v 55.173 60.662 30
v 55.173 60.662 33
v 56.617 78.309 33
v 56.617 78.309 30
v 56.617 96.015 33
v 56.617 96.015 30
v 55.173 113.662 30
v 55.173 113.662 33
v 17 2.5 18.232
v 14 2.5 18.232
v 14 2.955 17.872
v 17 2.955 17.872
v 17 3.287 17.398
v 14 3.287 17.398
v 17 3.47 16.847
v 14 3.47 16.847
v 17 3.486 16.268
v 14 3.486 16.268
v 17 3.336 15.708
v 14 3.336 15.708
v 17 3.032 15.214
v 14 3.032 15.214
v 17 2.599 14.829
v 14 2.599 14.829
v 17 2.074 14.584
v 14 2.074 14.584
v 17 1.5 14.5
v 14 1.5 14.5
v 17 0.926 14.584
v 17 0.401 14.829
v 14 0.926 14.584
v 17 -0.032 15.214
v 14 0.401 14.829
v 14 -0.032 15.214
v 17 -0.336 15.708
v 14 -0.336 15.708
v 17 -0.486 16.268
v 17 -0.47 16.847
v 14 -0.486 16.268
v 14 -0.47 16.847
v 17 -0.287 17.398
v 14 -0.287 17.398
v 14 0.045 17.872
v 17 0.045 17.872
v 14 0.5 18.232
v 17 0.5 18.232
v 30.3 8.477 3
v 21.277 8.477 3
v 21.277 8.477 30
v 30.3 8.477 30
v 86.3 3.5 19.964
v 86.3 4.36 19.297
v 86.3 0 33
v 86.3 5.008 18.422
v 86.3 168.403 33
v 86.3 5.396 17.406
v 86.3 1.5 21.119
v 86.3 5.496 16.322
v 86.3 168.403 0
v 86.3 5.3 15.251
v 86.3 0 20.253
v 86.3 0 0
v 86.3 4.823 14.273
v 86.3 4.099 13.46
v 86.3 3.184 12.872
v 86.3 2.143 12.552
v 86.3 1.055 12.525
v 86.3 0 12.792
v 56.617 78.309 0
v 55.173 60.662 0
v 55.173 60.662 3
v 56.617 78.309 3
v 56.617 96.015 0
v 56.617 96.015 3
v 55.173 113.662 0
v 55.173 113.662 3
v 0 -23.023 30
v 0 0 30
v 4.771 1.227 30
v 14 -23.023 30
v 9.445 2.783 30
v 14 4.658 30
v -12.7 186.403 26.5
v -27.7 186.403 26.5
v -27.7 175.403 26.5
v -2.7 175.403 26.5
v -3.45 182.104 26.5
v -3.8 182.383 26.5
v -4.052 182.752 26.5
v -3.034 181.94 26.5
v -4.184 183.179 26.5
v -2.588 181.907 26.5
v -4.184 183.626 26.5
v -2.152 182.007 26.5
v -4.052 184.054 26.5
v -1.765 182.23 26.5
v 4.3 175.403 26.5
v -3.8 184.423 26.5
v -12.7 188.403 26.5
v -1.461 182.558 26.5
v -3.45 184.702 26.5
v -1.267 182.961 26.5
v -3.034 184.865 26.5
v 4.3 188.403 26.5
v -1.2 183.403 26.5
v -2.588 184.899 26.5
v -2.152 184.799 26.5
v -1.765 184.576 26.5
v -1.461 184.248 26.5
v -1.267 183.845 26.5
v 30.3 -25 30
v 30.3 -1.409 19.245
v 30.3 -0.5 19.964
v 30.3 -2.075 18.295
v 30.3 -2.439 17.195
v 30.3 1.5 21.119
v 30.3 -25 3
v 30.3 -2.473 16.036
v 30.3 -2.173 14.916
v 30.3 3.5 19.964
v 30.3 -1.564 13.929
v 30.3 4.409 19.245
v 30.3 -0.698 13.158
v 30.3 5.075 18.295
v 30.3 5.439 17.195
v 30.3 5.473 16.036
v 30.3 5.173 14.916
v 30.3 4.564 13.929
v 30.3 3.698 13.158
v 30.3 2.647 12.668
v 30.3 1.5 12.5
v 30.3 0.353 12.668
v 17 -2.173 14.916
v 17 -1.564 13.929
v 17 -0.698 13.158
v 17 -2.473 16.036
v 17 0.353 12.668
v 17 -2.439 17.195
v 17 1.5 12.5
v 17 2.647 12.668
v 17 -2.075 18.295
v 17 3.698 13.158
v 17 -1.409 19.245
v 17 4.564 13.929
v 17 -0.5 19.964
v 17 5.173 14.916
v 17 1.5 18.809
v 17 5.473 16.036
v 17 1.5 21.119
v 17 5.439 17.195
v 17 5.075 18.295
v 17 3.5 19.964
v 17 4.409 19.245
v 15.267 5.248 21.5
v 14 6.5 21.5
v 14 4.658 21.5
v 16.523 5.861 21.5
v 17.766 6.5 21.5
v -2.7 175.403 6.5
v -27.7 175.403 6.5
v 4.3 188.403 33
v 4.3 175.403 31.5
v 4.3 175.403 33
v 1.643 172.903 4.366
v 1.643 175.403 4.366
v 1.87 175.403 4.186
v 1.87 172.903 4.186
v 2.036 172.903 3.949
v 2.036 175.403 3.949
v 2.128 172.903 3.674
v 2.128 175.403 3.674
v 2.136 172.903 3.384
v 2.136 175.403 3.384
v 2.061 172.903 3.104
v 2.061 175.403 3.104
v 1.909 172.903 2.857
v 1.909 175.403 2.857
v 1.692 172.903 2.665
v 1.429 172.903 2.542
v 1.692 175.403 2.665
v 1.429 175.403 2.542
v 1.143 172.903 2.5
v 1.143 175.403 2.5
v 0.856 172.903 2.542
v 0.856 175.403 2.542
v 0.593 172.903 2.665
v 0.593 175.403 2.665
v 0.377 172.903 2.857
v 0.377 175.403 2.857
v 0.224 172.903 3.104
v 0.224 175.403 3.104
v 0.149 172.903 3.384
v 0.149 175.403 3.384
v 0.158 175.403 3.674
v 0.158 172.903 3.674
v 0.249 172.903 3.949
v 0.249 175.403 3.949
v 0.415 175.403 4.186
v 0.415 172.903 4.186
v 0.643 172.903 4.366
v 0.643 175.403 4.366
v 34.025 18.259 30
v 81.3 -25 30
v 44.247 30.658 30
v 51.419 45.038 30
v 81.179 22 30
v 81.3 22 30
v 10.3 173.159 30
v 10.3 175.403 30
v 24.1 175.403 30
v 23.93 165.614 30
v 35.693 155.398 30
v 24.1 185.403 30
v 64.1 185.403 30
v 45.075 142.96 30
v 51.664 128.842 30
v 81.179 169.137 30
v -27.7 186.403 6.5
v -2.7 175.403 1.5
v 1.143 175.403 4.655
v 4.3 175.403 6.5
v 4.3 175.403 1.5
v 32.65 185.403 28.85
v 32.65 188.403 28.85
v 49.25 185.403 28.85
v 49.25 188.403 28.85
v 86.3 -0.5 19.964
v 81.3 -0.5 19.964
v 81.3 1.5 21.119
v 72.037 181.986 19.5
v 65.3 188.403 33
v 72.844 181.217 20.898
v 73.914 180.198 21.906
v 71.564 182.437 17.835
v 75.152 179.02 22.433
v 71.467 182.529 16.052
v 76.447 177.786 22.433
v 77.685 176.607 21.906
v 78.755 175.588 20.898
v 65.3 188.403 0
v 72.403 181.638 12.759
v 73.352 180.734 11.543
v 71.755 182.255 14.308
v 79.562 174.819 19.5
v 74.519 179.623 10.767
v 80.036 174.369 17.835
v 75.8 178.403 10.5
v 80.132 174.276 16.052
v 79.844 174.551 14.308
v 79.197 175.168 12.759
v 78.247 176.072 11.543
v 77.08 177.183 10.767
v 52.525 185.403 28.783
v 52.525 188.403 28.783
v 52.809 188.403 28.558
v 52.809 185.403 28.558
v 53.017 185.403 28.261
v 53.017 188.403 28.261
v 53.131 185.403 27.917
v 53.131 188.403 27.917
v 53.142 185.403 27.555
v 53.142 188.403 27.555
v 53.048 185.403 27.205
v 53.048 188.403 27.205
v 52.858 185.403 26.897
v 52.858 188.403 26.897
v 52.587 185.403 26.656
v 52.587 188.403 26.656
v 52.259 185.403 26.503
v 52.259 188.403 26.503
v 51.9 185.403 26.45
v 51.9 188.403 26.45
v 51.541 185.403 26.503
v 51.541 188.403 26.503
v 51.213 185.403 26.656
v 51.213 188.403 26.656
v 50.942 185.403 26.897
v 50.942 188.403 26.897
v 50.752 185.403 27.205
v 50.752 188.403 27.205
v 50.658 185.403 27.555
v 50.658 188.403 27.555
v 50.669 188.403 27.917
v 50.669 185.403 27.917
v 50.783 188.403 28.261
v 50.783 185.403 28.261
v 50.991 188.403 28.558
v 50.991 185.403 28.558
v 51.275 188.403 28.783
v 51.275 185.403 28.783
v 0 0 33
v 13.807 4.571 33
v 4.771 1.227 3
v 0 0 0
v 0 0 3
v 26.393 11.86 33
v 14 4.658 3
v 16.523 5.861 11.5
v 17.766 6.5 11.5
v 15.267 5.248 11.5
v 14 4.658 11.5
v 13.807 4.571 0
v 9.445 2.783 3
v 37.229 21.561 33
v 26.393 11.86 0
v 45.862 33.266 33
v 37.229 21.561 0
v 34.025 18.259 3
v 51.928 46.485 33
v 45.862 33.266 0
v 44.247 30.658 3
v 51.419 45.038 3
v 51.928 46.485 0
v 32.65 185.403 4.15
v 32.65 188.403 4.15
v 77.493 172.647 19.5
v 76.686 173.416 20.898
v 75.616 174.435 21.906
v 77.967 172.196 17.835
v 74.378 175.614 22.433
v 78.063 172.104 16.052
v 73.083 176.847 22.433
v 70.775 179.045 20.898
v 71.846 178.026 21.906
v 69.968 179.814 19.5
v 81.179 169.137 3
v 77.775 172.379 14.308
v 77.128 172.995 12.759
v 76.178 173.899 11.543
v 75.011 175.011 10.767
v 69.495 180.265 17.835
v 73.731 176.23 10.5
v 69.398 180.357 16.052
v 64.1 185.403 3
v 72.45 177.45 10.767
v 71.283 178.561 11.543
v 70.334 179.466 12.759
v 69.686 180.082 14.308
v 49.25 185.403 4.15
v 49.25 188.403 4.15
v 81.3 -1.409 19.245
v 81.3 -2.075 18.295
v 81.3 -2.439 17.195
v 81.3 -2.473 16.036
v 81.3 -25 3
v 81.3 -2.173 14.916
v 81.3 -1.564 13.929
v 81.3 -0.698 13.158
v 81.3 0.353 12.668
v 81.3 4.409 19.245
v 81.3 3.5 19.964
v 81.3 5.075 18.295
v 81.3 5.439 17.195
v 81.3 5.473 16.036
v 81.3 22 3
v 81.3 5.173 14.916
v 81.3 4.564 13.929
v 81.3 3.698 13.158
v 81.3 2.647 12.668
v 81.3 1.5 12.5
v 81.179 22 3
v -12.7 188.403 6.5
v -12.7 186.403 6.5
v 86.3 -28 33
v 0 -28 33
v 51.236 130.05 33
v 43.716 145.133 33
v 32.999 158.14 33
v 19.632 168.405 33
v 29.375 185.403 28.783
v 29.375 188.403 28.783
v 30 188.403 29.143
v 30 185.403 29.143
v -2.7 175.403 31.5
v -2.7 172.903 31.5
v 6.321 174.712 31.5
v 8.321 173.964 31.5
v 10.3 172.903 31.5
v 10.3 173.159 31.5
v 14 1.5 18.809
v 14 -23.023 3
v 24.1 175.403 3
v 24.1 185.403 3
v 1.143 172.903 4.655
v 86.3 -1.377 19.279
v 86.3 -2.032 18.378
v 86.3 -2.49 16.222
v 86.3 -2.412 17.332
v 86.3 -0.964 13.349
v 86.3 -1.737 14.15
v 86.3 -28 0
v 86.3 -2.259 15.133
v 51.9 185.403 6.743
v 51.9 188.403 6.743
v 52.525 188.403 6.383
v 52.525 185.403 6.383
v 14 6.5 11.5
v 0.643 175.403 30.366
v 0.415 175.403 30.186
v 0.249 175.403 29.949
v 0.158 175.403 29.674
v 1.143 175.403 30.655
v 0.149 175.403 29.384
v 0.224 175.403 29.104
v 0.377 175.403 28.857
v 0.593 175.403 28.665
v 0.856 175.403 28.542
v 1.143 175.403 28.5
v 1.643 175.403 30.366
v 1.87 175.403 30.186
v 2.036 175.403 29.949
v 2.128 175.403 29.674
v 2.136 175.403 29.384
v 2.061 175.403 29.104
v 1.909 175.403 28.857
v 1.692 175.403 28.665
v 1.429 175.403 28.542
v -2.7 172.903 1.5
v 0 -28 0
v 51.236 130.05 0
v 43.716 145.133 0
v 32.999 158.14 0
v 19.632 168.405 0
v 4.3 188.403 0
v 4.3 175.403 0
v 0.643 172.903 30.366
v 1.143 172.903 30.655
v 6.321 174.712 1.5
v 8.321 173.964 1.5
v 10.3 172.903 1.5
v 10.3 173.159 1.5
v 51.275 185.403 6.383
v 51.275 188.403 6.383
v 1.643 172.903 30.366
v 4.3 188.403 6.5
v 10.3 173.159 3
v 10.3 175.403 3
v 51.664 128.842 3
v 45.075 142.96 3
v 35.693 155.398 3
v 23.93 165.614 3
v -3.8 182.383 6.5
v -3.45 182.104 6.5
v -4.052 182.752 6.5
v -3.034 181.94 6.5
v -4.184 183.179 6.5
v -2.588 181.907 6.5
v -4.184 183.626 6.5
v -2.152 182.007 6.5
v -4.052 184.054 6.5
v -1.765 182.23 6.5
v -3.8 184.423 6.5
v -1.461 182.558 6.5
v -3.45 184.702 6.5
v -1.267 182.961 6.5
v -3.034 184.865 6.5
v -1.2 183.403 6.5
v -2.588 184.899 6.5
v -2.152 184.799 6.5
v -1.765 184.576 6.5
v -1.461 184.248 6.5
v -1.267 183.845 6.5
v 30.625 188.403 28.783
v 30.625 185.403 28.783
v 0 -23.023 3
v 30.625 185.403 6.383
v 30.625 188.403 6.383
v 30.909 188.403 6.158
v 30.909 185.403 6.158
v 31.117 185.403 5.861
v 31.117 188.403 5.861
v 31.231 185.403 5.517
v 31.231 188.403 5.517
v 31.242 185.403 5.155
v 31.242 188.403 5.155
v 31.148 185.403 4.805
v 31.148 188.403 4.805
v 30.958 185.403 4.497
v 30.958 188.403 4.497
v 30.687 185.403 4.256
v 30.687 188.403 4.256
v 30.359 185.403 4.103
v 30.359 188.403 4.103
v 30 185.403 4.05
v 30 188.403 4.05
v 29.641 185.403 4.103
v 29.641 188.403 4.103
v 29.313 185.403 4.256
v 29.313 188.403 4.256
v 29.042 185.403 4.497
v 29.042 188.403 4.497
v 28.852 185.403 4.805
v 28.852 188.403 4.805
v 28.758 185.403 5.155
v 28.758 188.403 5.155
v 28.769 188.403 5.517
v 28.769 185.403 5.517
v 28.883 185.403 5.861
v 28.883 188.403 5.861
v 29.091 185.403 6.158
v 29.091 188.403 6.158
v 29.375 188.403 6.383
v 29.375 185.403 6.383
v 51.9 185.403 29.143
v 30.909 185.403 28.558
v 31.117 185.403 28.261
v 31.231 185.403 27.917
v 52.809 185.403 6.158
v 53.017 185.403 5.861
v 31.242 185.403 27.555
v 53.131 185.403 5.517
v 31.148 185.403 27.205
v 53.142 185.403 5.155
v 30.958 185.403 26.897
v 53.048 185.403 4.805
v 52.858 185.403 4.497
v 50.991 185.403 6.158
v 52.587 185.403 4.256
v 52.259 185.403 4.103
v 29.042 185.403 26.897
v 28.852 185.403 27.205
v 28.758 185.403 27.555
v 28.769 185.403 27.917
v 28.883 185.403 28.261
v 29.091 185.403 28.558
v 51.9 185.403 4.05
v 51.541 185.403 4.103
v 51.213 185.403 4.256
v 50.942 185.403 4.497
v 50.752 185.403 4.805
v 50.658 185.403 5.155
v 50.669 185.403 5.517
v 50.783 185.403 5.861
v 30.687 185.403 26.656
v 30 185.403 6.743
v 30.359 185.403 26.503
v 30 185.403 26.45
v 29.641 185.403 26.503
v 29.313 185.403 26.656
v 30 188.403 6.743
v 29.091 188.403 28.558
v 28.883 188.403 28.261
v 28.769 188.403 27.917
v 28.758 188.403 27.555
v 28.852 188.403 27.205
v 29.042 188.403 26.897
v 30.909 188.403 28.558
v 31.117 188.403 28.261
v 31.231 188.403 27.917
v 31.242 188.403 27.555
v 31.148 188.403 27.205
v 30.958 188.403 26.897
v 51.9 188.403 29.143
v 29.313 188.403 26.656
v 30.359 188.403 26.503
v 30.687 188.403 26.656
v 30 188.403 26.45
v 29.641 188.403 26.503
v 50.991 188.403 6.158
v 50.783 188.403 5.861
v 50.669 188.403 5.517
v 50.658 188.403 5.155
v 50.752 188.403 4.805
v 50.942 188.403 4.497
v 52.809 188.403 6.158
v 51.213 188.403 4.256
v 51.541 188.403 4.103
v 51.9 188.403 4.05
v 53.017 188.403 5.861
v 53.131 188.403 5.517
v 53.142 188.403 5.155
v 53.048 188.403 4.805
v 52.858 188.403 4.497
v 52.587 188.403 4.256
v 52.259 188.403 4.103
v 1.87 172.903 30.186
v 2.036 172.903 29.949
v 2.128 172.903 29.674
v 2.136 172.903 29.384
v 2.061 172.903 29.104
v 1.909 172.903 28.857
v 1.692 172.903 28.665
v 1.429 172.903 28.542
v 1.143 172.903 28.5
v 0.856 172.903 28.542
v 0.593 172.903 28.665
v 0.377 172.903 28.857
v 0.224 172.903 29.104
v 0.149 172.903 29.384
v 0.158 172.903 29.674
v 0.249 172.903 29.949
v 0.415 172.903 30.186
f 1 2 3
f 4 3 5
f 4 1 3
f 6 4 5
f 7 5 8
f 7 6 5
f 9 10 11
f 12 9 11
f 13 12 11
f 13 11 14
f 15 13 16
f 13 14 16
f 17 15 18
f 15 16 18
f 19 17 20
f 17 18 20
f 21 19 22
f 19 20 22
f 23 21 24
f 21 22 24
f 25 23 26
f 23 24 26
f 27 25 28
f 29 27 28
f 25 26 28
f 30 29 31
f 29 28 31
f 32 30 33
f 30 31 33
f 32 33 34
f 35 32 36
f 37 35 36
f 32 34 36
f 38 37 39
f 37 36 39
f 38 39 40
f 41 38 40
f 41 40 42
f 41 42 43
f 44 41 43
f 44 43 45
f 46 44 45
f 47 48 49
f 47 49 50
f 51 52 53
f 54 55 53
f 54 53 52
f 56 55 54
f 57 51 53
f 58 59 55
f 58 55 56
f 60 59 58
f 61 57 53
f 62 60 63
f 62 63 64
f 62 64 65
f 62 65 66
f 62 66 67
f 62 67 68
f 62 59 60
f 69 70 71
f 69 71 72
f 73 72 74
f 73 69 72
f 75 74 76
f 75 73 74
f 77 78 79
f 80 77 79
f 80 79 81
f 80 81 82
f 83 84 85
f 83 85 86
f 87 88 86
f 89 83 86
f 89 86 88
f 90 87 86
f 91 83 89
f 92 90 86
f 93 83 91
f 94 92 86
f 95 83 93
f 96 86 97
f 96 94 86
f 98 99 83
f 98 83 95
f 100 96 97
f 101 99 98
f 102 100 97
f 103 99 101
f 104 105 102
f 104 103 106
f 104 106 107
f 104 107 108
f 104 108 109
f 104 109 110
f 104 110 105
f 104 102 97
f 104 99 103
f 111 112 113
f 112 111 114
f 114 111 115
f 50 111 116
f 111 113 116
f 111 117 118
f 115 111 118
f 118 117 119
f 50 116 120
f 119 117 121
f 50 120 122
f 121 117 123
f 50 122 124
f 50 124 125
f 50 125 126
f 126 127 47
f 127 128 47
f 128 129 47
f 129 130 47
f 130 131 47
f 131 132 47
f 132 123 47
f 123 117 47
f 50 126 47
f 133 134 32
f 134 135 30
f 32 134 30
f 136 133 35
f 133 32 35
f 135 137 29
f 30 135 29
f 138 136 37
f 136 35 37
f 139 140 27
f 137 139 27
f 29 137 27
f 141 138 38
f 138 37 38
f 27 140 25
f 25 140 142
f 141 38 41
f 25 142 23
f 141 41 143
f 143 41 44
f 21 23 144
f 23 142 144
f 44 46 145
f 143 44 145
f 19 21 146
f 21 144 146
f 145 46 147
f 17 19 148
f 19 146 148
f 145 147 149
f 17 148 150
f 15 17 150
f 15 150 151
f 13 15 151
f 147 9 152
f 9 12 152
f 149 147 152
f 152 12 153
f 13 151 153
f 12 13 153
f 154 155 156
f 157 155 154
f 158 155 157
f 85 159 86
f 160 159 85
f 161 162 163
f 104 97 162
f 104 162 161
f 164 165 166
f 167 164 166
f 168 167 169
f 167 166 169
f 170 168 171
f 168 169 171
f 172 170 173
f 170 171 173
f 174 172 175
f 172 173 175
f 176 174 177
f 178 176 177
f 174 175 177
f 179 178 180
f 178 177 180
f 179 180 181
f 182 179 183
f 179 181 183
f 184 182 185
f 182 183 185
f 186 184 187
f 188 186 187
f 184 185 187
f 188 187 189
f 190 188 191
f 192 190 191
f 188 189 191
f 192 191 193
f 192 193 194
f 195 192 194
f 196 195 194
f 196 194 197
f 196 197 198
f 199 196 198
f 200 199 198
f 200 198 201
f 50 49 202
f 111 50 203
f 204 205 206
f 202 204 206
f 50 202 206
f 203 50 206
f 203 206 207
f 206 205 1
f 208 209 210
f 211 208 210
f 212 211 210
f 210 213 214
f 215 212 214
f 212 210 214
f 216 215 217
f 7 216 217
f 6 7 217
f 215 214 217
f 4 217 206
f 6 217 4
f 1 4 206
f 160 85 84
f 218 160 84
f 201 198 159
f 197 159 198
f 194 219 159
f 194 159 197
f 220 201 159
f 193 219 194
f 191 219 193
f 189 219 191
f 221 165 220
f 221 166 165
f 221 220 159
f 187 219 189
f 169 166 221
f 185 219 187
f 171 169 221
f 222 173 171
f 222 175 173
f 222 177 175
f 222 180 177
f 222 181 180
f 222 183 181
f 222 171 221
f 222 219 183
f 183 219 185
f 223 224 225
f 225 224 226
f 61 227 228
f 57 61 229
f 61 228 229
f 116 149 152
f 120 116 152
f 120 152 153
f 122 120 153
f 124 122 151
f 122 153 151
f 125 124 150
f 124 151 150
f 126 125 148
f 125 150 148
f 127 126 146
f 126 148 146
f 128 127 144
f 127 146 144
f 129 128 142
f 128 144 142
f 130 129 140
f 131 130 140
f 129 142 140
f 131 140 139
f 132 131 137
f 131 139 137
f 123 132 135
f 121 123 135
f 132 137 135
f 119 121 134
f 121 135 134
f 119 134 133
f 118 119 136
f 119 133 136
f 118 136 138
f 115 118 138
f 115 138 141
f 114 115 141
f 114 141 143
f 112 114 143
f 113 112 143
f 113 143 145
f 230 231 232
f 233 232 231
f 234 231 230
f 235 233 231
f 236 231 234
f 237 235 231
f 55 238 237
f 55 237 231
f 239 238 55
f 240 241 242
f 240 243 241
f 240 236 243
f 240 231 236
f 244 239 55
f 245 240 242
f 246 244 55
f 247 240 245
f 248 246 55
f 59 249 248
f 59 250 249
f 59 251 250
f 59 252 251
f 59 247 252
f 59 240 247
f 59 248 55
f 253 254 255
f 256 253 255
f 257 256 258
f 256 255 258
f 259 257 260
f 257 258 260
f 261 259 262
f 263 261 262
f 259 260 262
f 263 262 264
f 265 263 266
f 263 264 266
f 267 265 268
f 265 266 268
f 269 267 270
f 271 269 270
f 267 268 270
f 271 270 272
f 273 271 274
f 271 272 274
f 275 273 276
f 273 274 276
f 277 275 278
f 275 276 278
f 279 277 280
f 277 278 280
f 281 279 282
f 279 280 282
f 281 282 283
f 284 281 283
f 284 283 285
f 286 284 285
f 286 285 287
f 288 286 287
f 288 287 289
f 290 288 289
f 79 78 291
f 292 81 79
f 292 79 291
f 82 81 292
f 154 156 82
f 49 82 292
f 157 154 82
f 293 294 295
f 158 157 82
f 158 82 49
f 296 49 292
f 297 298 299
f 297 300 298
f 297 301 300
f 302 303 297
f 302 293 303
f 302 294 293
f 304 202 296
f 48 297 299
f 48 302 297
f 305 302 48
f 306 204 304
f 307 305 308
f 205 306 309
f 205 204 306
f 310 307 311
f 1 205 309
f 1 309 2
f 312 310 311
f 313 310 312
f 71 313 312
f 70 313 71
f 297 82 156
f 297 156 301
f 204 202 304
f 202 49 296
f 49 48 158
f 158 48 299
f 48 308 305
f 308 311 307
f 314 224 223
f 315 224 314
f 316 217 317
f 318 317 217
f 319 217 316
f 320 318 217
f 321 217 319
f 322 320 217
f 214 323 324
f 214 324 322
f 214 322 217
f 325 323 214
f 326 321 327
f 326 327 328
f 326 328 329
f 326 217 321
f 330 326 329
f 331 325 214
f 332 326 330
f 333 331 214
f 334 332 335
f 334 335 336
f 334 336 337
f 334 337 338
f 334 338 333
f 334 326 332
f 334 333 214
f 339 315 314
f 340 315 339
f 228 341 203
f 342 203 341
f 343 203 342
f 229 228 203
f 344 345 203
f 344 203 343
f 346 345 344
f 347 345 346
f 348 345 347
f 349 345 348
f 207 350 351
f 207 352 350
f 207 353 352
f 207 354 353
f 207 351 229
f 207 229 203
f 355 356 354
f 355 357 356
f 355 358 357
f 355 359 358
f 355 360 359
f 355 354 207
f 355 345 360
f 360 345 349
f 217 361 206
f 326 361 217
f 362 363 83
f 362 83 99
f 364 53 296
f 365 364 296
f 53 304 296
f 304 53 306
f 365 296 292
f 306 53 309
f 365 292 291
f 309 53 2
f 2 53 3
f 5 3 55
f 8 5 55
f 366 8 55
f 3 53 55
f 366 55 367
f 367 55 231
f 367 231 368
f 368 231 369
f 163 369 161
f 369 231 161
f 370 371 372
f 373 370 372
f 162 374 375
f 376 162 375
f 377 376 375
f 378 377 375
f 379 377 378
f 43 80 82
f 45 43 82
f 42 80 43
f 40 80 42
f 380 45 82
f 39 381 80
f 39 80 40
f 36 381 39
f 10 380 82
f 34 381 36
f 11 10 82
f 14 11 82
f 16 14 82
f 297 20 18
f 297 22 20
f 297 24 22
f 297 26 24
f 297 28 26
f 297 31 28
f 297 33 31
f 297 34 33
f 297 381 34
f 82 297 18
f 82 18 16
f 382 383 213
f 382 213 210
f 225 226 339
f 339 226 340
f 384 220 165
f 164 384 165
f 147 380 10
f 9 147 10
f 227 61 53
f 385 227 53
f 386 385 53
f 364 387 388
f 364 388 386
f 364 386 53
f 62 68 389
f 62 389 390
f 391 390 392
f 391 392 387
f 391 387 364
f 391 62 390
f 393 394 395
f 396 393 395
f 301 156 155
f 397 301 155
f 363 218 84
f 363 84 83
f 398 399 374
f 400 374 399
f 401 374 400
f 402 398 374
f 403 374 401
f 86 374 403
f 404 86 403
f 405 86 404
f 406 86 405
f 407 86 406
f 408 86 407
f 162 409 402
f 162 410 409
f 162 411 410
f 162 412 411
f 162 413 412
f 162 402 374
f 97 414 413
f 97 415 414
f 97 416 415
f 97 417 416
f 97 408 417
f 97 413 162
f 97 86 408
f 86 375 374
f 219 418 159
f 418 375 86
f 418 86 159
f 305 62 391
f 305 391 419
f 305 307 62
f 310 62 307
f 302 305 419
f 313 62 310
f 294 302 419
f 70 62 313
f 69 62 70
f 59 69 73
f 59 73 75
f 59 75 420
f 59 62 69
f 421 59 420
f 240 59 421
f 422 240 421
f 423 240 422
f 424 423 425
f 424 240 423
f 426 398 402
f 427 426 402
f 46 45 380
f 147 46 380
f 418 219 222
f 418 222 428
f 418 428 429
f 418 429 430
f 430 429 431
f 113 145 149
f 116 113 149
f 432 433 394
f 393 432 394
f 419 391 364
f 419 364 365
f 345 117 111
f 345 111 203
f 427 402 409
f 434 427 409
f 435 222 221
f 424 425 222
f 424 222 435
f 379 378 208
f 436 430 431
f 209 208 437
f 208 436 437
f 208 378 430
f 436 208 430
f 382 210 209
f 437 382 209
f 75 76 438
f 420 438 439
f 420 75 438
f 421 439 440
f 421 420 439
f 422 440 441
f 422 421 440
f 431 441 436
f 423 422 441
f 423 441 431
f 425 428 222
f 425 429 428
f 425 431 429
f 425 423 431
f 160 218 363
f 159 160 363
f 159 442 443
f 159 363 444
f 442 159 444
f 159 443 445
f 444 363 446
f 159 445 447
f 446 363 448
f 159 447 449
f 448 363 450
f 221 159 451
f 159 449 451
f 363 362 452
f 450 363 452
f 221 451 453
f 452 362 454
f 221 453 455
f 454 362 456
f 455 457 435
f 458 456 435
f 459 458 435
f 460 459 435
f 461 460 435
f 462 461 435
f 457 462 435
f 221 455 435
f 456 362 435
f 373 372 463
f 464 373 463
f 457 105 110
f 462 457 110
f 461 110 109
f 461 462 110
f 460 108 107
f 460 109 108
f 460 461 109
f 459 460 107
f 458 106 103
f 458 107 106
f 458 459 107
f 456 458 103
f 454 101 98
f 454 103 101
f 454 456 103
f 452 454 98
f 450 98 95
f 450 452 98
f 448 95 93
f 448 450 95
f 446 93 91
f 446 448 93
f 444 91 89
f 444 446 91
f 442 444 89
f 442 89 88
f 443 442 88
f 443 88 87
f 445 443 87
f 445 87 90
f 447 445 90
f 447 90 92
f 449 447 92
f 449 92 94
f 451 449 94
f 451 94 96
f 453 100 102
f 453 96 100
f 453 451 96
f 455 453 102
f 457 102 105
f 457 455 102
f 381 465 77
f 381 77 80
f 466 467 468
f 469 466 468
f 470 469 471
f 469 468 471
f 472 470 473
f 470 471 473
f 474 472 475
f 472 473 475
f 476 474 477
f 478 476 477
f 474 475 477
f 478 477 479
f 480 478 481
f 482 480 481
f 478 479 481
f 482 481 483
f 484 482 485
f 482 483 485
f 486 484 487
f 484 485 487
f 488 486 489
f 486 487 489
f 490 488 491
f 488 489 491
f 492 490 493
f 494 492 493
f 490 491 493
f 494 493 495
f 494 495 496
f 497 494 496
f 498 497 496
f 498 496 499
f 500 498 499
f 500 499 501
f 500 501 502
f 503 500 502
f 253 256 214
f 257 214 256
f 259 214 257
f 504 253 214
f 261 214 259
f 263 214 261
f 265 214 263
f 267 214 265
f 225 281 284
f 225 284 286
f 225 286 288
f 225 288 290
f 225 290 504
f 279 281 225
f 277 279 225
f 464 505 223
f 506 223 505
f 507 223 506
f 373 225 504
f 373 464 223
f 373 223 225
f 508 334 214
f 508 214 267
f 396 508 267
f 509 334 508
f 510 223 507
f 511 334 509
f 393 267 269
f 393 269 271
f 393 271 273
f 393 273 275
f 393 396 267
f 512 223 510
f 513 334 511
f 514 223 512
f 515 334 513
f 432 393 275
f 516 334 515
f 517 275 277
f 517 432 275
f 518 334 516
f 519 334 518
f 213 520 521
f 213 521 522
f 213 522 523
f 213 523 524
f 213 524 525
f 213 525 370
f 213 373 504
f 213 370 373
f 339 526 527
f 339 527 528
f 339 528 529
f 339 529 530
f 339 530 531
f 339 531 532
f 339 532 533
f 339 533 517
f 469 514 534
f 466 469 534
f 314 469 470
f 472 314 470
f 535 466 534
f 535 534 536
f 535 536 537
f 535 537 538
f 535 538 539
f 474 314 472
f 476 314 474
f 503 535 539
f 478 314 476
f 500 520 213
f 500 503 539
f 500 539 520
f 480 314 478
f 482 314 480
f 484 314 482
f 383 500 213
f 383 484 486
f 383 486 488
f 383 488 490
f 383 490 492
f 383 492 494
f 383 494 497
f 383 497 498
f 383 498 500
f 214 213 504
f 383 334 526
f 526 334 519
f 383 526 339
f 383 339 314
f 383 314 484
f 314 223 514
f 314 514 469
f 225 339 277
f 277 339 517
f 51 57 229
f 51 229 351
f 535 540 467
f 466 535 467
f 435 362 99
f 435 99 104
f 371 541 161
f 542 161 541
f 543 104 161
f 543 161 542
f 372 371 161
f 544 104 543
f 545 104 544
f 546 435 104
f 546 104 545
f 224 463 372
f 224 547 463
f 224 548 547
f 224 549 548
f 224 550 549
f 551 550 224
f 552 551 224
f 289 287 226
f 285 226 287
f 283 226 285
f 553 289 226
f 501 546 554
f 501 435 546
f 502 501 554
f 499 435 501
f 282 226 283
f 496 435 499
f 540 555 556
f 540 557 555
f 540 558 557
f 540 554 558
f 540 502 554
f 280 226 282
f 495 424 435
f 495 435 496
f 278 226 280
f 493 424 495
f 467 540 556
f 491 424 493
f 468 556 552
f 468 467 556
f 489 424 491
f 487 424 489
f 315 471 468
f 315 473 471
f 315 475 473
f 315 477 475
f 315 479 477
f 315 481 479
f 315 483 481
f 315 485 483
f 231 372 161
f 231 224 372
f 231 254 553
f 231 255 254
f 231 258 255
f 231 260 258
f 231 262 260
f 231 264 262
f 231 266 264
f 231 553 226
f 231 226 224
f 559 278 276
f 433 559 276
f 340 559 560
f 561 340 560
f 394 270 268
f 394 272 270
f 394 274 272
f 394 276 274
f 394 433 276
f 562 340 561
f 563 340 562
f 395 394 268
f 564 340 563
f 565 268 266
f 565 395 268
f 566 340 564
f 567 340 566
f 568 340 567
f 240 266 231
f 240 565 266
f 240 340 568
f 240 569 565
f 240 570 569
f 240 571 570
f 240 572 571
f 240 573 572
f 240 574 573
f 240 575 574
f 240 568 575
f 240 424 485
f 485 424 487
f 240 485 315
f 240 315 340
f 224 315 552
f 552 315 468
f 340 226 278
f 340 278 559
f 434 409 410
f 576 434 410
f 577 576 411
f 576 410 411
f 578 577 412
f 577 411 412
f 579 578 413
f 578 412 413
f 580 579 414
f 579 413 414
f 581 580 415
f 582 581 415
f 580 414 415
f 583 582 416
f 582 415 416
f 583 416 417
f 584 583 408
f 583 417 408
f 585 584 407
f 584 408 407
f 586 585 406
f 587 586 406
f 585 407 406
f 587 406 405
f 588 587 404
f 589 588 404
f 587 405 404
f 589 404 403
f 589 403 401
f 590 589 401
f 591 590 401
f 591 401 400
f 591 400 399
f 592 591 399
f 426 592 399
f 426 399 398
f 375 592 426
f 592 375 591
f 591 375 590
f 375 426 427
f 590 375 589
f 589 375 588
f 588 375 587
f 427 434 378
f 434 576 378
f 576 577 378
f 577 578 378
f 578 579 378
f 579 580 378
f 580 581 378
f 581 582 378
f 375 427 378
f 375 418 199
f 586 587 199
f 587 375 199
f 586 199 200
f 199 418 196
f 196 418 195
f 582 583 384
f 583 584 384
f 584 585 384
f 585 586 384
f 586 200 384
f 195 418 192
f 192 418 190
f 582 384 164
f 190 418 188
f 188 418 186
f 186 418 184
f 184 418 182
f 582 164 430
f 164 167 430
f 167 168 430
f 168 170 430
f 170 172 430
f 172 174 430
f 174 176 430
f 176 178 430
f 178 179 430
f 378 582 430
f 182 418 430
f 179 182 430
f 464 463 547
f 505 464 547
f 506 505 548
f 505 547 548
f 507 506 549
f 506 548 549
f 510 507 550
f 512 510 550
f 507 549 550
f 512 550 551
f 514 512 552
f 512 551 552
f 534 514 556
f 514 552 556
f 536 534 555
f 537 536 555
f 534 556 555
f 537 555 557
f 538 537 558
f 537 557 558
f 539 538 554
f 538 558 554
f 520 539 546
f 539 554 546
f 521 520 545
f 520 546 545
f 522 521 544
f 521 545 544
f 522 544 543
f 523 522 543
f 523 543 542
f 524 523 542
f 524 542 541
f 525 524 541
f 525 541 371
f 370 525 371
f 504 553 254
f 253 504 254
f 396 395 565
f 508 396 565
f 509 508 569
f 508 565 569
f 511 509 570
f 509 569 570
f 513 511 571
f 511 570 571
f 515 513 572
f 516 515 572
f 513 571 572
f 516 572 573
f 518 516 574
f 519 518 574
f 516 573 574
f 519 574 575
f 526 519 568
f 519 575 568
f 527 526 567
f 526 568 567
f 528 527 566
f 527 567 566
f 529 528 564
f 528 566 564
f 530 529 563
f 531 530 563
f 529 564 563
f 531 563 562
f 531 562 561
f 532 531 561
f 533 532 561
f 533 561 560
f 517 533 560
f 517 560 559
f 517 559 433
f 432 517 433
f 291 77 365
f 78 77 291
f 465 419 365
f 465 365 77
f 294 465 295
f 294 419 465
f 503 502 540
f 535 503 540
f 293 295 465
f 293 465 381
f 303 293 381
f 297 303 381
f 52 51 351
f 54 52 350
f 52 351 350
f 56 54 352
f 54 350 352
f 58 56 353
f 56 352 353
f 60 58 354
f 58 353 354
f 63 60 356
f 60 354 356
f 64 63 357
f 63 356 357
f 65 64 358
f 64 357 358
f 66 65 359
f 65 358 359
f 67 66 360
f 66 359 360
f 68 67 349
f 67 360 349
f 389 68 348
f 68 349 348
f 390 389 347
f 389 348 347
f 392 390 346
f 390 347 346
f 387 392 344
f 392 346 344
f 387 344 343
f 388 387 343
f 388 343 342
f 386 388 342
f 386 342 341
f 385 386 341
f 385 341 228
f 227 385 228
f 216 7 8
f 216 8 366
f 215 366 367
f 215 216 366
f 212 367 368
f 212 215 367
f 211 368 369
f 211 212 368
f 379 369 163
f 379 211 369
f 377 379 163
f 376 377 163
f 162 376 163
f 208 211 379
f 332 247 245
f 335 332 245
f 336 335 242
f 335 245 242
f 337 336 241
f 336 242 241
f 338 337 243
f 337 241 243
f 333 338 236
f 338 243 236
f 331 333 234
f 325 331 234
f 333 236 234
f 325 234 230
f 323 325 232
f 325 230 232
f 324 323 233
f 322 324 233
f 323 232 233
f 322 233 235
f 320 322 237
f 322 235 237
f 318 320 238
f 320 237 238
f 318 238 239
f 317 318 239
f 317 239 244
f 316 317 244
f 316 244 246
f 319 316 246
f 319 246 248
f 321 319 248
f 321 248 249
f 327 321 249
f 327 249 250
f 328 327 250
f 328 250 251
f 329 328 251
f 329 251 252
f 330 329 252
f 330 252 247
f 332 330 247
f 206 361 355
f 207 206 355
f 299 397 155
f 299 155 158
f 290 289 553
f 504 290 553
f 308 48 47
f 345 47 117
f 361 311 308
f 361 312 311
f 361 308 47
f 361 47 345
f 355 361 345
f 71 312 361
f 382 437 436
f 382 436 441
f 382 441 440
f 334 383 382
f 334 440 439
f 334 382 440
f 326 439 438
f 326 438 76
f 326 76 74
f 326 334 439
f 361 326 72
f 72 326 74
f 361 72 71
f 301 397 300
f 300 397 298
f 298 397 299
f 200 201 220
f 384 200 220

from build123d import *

# Parameters (mm, degrees)
EXTRUDE_6_DEPTH      = 33
CUT_EXTRUDE_START    = 3
CUT_EXTRUDE_2_DEPTH  = 27
EXTRUDE_START        = 6.5
SKETCH_7_W           = 32
SKETCH_7_H           = 13
EXTRUDE_7_DEPTH      = 20
EXTRUDE_START_2      = 1.5
SKETCH_11_W          = 13
SKETCH_11_H          = 2.5
EXTRUDE_15_DEPTH     = 30
CUT_EXTRUDE_START_2  = 180
CUT_EXTRUDE_3_DEPTH  = 10
SKETCH_13_R          = 1.5
CUT_EXTRUDE_4_DEPTH  = 30
SKETCH_14_W          = 15
SKETCH_14_H          = 2
CUT_EXTRUDE_5_DEPTH  = 30
EXTRUDE_START_3      = 11.5
SKETCH_15_W          = 67.299618531
SKETCH_15_H          = 10
EXTRUDE_16_DEPTH     = 10
CUT_EXTRUDE_START_3  = 17
CUT_EXTRUDE_7_DEPTH  = 75
CUT_EXTRUDE_START_4  = 13
CUT_EXTRUDE_9_DEPTH  = 5
SKETCH_20_W          = 16.6
SKETCH_20_H          = 24.7
CUT_EXTRUDE_10_DEPTH = 5
SKETCH_21_R          = 6
CUT_EXTRUDE_11_DEPTH = 5
SKETCH_22_W          = 51
SKETCH_22_H          = 47
CUT_EXTRUDE_12_DEPTH = 27


with BuildPart() as part:
    # Эскиз1 → Бобышка-Вытянуть6 (new body)
    with BuildSketch(Plane.XY):
        with BuildLine():
            Line((4.299618531, 175.402841826), (4.299618531, 188.402841826))
            Line((4.299618531, 188.402841826), (65.299618531, 188.402841826))
            Line((65.299618531, 188.402841826), (86.299618531, 168.402841826))
            Line((86.299618531, 168.402841826), (86.299619, 0))
            Line((86.299619, 0), (86.299619, -28))
            Line((86.299619, -28), (0, -28))
            Line((0, -28), (0, 0))
            ThreePointArc((0, 0), (37.229295141, 21.561020186), (55.173142182, 60.662380285))
            ThreePointArc((55.173142182, 60.662380285), (56.797307883, 87.162380285), (55.173142182, 113.662380285))
            ThreePointArc((55.173142182, 113.662380285), (38.726552267, 151.940422917), (4.299618531, 175.402841826))
        make_face()
    extrude(amount=EXTRUDE_6_DEPTH)

    # Эскиз5 → Вырез-Вытянуть2 (cut)
    with BuildSketch(Plane.XY.offset(CUT_EXTRUDE_START)):
        Polygon((24.099618531, 175.402841826), (4.299618531, 175.402841826), (4.299618531, 169.136823089), (-18.700381469, 169.136823089), (-18.700381469, -23.02337805), (14, -23.02337805), (14, 8.47662195), (81.178938205, 8.47662195), (81.178938205, 169.136823089), (64.099618531, 185.402841826), (24.099618531, 185.402841826), align=None)
    extrude(amount=CUT_EXTRUDE_2_DEPTH, mode=Mode.SUBTRACT)

    # Эскиз7 → Бобышка-Вытянуть7 (add)
    with BuildSketch(Plane.XY.offset(EXTRUDE_START)):
        with Locations((-11.700381469, 181.902841826)):
            Rectangle(SKETCH_7_W, SKETCH_7_H)
    extrude(amount=EXTRUDE_7_DEPTH)

    # Эскиз11 → Бобышка-Вытянуть15 (add)
    with BuildSketch(Plane.XY.offset(EXTRUDE_START_2)):
        with Locations((3.799618531, 174.152841826)):
            Rectangle(SKETCH_11_W, SKETCH_11_H)
    extrude(amount=EXTRUDE_15_DEPTH)

    # Эскиз12 → Вырез-Вытянуть3 (cut)
    with BuildSketch(Plane(origin=(0, 0, 0), x_dir=(1, 0, 0), z_dir=(0, 1, 0)).offset(CUT_EXTRUDE_START_2)):
        with BuildLine():
            Line((1.142696527, -30.654700538), (1.642696527, -30.366025404))
            ThreePointArc((1.642696527, -30.366025404), (1.142696527, -28.5), (0.642696527, -30.366025404))
            Line((0.642696527, -30.366025404), (1.142696527, -30.654700538))
        make_face()
        with BuildLine():
            Line((1.142696527, -4.654700538), (1.642696527, -4.366025404))
            ThreePointArc((1.642696527, -4.366025404), (1.142696527, -2.5), (0.642696527, -4.366025404))
            Line((0.642696527, -4.366025404), (1.142696527, -4.654700538))
        make_face()
    extrude(amount=-CUT_EXTRUDE_3_DEPTH, mode=Mode.SUBTRACT)

    # Эскиз13 → Вырез-Вытянуть4 (cut)
    with BuildSketch(Plane.XY):
        with Locations((-2.700381469, 183.402841826)):
            Circle(SKETCH_13_R)
    extrude(amount=CUT_EXTRUDE_4_DEPTH, mode=Mode.SUBTRACT)

    # Эскиз14 → Вырез-Вытянуть5 (cut)
    with BuildSketch(Plane.XY):
        with Locations((-20.200381469, 187.402841826)):
            Rectangle(SKETCH_14_W, SKETCH_14_H)
    extrude(amount=CUT_EXTRUDE_5_DEPTH, mode=Mode.SUBTRACT)

    # Эскиз15 → Бобышка-Вытянуть16 (add)
    with BuildSketch(Plane.XY.offset(EXTRUDE_START_3)):
        with Locations((47.649809735, 1.5)):
            Rectangle(SKETCH_15_W, SKETCH_15_H)
    extrude(amount=EXTRUDE_16_DEPTH)

    # Эскиз17 → Вырез-Вытянуть7 (cut)
    with BuildSketch(Plane(origin=(0, 0, 0), x_dir=(0, 0, -1), z_dir=(1, 0, 0)).offset(CUT_EXTRUDE_START_3)):
        with BuildLine():
            Line((-21.118802154, 1.5), (-19.964101615, 3.5))
            ThreePointArc((-19.964101615, 3.5), (-12.5, 1.5), (-19.964101615, -0.5))
            Line((-19.964101615, -0.5), (-21.118802154, 1.5))
        make_face()
    extrude(amount=CUT_EXTRUDE_7_DEPTH, mode=Mode.SUBTRACT)

    # Эскиз18 → Вырез-Вытянуть9 (cut)
    with BuildSketch(Plane(origin=(0, 0, 0), x_dir=(0, 0, -1), z_dir=(1, 0, 0)).offset(CUT_EXTRUDE_START_4)):
        with BuildLine():
            Line((-18.809401077, 1.5), (-18.232050808, 2.5))
            ThreePointArc((-18.232050808, 2.5), (-14.5, 1.5), (-18.232050808, 0.5))
            Line((-18.232050808, 0.5), (-18.809401077, 1.5))
        make_face()
    extrude(amount=CUT_EXTRUDE_9_DEPTH, mode=Mode.SUBTRACT)

    # Эскиз20 → Вырез-Вытянуть10 (cut)
    with BuildSketch(Plane(origin=(0, 188.402841826, 0), x_dir=(1, 0, 0), z_dir=(0, 1, 0))):
        with Locations((40.95, -16.5)):
            Rectangle(SKETCH_20_W, SKETCH_20_H)
        with BuildLine():
            Line((30, -29.143375673), (30.625, -28.782531755))
            ThreePointArc((30.625, -28.782531755), (30, -26.45), (29.375, -28.782531755))
            Line((29.375, -28.782531755), (30, -29.143375673))
        make_face()
        with BuildLine():
            Line((30, -6.743375673), (30.625, -6.382531755))
            ThreePointArc((30.625, -6.382531755), (30, -4.05), (29.375, -6.382531755))
            Line((29.375, -6.382531755), (30, -6.743375673))
        make_face()
        with BuildLine():
            Line((51.9, -6.743375673), (52.525, -6.382531755))
            ThreePointArc((52.525, -6.382531755), (51.9, -4.05), (51.275, -6.382531755))
            Line((51.275, -6.382531755), (51.9, -6.743375673))
        make_face()
        with BuildLine():
            Line((51.9, -29.143375673), (52.525, -28.782531755))
            ThreePointArc((52.525, -28.782531755), (51.9, -26.45), (51.275, -28.782531755))
            Line((51.275, -28.782531755), (51.9, -29.143375673))
        make_face()
    extrude(amount=-CUT_EXTRUDE_10_DEPTH, mode=Mode.SUBTRACT)

    # Эскиз21 → Вырез-Вытянуть11 (cut)
    with BuildSketch(Plane(origin=(125.147492247, 131.404866859, 0), x_dir=(0, 0, -1), z_dir=(0.6896551724137922, 0.7241379310344839, 0))):
        with Locations((-16.5, 68.147063703)):
            Circle(SKETCH_21_R)
    extrude(amount=-CUT_EXTRUDE_11_DEPTH, mode=Mode.SUBTRACT)

    # Эскиз22 → Вырез-Вытянуть12 (cut)
    with BuildSketch(Plane.XY.offset(CUT_EXTRUDE_START)):
        with Locations((55.799619, -1.5)):
            Rectangle(SKETCH_22_W, SKETCH_22_H)
    extrude(amount=CUT_EXTRUDE_12_DEPTH, mode=Mode.SUBTRACT)


solid = part.part
